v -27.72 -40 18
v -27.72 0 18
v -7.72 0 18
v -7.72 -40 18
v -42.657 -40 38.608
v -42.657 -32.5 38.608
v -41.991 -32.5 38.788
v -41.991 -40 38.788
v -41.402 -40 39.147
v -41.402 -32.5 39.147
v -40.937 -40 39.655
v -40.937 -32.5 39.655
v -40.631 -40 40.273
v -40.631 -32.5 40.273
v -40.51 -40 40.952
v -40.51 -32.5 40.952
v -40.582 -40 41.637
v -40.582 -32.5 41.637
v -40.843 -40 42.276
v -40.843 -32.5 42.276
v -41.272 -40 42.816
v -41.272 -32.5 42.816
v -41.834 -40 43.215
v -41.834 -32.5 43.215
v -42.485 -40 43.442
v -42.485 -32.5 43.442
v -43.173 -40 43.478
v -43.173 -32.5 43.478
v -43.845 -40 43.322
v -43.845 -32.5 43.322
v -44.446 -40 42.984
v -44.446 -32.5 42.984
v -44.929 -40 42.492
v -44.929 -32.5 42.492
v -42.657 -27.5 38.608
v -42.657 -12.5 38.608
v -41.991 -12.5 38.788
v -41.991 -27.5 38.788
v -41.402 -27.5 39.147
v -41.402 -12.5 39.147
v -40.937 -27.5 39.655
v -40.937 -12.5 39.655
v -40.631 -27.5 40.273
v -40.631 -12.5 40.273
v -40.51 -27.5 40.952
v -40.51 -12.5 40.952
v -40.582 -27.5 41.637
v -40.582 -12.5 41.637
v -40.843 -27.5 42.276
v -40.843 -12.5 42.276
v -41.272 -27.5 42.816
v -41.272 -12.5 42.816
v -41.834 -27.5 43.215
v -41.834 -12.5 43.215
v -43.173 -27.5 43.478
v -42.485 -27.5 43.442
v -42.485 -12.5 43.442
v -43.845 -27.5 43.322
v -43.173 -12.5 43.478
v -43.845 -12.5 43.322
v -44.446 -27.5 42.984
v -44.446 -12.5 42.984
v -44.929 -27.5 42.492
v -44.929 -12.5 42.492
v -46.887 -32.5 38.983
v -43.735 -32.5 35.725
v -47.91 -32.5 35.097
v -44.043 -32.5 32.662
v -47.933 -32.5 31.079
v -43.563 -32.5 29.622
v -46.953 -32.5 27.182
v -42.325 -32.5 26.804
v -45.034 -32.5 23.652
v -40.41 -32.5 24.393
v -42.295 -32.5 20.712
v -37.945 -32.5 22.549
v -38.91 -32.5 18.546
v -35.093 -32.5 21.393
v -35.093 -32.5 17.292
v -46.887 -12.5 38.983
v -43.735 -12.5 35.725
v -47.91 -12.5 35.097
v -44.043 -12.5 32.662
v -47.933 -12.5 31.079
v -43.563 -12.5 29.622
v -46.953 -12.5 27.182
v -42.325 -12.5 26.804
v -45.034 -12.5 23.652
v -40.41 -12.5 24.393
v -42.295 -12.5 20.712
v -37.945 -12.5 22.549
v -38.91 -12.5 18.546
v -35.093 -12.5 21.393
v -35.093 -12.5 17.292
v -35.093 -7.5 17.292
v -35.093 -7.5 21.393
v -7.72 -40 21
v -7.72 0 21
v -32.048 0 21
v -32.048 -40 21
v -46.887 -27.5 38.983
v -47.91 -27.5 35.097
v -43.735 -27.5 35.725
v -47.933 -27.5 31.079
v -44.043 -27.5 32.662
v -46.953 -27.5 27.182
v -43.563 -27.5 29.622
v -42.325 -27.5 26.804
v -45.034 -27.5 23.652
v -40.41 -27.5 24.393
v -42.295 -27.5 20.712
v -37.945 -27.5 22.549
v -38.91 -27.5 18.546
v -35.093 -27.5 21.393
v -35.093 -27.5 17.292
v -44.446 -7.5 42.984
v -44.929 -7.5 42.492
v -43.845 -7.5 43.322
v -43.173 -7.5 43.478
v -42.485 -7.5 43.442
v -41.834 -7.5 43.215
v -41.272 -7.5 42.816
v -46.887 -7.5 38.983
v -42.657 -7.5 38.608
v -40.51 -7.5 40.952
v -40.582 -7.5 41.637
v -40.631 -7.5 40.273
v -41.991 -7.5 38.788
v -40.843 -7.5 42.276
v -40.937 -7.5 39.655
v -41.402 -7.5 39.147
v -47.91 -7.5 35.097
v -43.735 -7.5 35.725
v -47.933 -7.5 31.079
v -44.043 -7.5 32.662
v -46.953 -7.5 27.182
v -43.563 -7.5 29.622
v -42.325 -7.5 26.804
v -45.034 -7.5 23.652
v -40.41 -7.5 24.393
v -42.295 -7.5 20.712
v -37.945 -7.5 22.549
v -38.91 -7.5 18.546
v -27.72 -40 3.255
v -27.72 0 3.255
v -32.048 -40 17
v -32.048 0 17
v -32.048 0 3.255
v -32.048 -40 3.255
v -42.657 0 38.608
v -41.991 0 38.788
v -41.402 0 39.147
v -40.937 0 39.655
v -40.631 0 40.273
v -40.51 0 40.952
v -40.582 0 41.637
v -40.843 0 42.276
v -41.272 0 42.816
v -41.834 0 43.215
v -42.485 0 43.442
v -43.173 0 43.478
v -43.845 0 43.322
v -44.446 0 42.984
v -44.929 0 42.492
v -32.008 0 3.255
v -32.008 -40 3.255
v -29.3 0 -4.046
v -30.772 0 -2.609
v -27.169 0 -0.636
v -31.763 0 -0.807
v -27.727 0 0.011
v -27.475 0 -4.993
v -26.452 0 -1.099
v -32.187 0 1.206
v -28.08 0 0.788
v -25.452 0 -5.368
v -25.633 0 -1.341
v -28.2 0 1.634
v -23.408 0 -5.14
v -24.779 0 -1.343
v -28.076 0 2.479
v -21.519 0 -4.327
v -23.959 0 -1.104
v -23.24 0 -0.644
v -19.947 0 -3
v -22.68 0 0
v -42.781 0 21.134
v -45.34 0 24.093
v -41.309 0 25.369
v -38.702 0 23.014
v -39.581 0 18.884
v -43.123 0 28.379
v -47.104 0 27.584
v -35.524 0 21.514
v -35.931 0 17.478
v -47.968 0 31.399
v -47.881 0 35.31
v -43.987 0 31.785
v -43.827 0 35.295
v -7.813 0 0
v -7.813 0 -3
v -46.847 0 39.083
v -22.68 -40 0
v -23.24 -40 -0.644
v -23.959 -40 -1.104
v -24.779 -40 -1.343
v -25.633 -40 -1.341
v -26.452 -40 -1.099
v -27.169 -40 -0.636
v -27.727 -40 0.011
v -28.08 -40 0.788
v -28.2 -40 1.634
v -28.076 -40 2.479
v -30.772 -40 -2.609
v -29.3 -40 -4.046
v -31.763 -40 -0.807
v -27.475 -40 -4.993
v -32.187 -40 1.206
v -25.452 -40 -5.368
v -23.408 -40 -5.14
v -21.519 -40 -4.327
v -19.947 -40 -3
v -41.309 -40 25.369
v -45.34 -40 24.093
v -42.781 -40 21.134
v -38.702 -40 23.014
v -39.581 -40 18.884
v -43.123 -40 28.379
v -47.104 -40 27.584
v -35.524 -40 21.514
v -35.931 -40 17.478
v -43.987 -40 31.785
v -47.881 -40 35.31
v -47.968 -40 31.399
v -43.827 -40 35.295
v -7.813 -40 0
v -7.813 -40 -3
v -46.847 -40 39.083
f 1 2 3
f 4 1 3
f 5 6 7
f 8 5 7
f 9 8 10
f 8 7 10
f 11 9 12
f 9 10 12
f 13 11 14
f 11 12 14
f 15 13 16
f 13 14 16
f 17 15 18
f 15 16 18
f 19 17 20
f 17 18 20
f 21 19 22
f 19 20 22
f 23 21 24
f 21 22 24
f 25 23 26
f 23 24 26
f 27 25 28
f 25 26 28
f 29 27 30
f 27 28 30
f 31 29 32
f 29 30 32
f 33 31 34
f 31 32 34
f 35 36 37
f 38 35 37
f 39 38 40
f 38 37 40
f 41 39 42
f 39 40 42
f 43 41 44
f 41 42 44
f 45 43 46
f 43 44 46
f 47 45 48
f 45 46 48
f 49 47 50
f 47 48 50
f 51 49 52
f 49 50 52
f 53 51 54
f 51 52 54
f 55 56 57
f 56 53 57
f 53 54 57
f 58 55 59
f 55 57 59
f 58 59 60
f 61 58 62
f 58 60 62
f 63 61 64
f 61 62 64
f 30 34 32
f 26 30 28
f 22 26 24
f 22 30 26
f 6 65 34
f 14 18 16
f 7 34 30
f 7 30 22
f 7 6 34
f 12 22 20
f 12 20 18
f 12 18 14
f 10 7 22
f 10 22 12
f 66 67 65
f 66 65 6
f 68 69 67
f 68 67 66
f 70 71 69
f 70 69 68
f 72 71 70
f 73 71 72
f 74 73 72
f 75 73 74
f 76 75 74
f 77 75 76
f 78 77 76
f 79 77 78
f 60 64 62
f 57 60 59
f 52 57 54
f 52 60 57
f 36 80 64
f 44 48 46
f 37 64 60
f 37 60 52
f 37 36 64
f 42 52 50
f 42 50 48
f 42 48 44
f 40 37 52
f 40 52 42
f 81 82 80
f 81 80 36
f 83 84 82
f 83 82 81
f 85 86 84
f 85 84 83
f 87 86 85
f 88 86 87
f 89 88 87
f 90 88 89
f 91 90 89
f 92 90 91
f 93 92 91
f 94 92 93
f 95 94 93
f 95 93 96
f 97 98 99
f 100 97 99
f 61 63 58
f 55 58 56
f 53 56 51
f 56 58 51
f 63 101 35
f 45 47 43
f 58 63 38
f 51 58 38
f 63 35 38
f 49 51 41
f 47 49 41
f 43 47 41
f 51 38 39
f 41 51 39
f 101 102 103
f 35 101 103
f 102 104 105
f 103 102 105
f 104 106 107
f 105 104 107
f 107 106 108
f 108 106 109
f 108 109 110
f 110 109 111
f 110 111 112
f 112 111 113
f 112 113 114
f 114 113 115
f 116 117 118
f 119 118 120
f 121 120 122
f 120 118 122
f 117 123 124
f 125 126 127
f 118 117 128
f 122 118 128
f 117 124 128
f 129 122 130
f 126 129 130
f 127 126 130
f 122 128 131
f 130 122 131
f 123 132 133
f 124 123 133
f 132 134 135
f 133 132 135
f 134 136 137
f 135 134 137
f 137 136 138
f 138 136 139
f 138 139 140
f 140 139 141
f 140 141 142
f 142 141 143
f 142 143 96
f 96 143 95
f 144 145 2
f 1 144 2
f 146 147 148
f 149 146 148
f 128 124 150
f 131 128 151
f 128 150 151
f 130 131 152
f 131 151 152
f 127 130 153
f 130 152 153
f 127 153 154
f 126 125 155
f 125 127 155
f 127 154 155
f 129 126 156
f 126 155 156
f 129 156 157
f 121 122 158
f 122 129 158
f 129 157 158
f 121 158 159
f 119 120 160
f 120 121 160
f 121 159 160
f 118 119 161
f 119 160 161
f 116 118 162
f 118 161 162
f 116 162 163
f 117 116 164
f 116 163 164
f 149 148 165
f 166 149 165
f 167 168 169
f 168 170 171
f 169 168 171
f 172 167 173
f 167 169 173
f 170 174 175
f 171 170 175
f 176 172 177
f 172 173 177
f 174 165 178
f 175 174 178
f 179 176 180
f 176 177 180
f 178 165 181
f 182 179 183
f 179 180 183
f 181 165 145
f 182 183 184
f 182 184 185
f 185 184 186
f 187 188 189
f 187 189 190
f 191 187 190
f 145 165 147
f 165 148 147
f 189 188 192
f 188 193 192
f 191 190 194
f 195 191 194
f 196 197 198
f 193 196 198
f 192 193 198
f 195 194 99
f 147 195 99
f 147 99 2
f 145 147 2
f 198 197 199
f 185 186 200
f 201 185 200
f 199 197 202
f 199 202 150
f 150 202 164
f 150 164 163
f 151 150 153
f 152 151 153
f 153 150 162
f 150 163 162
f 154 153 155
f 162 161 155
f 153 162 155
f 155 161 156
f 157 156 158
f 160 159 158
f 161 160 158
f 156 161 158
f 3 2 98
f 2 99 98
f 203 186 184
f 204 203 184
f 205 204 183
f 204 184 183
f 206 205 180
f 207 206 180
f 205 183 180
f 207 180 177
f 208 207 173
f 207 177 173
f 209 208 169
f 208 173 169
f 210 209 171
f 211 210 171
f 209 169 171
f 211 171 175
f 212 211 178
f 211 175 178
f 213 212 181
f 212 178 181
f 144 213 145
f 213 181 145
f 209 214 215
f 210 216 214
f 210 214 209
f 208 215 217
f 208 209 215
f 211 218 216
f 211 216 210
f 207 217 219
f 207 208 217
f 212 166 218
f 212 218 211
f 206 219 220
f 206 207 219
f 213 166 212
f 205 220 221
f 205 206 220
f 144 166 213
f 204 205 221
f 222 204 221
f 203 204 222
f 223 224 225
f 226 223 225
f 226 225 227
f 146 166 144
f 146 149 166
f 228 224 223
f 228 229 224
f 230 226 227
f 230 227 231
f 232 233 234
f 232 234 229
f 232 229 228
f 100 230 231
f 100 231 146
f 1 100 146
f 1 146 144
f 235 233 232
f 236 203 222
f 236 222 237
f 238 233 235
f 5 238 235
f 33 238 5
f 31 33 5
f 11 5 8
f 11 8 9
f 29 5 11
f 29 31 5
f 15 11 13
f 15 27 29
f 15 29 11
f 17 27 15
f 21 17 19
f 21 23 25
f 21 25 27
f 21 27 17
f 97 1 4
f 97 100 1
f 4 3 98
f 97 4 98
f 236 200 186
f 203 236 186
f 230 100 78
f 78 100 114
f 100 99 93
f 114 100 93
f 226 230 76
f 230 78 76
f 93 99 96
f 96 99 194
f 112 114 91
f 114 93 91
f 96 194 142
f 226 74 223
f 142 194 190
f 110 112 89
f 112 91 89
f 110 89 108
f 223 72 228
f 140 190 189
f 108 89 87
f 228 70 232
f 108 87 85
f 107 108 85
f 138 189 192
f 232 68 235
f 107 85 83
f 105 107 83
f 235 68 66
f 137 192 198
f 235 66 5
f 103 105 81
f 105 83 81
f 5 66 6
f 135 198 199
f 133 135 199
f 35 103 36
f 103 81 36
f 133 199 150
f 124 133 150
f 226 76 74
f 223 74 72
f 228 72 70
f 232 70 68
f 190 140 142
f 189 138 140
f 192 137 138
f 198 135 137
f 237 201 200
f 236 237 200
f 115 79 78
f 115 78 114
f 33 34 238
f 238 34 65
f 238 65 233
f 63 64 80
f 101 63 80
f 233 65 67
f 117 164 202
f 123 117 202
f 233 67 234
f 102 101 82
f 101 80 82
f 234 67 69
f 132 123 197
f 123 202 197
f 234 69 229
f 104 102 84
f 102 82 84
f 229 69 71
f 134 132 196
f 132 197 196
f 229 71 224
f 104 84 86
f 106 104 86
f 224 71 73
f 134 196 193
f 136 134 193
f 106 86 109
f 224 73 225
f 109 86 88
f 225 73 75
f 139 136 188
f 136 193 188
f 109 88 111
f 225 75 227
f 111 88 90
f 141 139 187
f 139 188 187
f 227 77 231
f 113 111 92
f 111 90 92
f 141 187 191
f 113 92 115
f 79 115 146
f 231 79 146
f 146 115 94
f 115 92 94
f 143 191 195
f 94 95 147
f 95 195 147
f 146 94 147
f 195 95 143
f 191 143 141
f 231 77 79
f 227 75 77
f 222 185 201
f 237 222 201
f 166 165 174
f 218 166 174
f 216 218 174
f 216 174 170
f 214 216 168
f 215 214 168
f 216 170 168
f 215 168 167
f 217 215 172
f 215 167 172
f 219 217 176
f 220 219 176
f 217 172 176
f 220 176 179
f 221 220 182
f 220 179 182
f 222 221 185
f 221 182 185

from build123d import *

# Parameters (mm, degrees)
F0_W     = 20
F0_H     = 3
F1_DEPTH = 40
F2_W     = 21.25
F2_H     = 5
F3_DEPTH = 50


with BuildPart() as f1:
    # F0 (on Front) → F1 (new body)
    with BuildSketch(Plane.XZ):
        with Locations((-17.720056, 19.5)):
            Rectangle(F0_W, F0_H)
        Polygon((-27.720056, 18), (-27.720056, 21), (-32.048252, 21), (-32.048252, 17), (-32.048252, 3.254739), (-32.00801, 3.254739), (-27.720056, 3.254739), align=None)
        with BuildLine():
            Line((-32.048252, 17), (-32.048252, 21))
            ThreePointArc((-32.048252, 21), (-42.326909, 26.807327), (-42.65698, 38.608466))
            ThreePointArc((-42.65698, 38.608466), (-40.843318, 42.27556), (-44.92868, 42.491816))
            ThreePointArc((-44.92868, 42.491816), (-46.328817, 25.784359), (-32.048252, 17))
        make_face()
        with BuildLine():
            ThreePointArc((-22.679552, 0), (-26.827174, -0.892883), (-27.720056, 3.254739))
            Line((-27.720056, 3.254739), (-32.00801, 3.254739))
            ThreePointArc((-32.00801, 3.254739), (-28.422472, -4.58668), (-19.947428, -3))
            Line((-19.947428, -3), (-22.679552, -3))
            Line((-22.679552, -3), (-22.679552, 0))
        make_face()
        Polygon((-7.813289, 0), (-22.679552, 0), (-22.679552, -3), (-19.947428, -3), (-7.813289, -3), align=None)
    extrude(amount=F1_DEPTH)

    # F2 (on Top) → F3 (cut)
    with BuildSketch(Plane.XY):
        with Locations((-45.717653, -10)):
            Rectangle(F2_W, F2_H)
        with Locations((-45.717653, -30)):
            Rectangle(F2_W, F2_H)
    extrude(amount=F3_DEPTH, mode=Mode.SUBTRACT)


solid = f1.part
